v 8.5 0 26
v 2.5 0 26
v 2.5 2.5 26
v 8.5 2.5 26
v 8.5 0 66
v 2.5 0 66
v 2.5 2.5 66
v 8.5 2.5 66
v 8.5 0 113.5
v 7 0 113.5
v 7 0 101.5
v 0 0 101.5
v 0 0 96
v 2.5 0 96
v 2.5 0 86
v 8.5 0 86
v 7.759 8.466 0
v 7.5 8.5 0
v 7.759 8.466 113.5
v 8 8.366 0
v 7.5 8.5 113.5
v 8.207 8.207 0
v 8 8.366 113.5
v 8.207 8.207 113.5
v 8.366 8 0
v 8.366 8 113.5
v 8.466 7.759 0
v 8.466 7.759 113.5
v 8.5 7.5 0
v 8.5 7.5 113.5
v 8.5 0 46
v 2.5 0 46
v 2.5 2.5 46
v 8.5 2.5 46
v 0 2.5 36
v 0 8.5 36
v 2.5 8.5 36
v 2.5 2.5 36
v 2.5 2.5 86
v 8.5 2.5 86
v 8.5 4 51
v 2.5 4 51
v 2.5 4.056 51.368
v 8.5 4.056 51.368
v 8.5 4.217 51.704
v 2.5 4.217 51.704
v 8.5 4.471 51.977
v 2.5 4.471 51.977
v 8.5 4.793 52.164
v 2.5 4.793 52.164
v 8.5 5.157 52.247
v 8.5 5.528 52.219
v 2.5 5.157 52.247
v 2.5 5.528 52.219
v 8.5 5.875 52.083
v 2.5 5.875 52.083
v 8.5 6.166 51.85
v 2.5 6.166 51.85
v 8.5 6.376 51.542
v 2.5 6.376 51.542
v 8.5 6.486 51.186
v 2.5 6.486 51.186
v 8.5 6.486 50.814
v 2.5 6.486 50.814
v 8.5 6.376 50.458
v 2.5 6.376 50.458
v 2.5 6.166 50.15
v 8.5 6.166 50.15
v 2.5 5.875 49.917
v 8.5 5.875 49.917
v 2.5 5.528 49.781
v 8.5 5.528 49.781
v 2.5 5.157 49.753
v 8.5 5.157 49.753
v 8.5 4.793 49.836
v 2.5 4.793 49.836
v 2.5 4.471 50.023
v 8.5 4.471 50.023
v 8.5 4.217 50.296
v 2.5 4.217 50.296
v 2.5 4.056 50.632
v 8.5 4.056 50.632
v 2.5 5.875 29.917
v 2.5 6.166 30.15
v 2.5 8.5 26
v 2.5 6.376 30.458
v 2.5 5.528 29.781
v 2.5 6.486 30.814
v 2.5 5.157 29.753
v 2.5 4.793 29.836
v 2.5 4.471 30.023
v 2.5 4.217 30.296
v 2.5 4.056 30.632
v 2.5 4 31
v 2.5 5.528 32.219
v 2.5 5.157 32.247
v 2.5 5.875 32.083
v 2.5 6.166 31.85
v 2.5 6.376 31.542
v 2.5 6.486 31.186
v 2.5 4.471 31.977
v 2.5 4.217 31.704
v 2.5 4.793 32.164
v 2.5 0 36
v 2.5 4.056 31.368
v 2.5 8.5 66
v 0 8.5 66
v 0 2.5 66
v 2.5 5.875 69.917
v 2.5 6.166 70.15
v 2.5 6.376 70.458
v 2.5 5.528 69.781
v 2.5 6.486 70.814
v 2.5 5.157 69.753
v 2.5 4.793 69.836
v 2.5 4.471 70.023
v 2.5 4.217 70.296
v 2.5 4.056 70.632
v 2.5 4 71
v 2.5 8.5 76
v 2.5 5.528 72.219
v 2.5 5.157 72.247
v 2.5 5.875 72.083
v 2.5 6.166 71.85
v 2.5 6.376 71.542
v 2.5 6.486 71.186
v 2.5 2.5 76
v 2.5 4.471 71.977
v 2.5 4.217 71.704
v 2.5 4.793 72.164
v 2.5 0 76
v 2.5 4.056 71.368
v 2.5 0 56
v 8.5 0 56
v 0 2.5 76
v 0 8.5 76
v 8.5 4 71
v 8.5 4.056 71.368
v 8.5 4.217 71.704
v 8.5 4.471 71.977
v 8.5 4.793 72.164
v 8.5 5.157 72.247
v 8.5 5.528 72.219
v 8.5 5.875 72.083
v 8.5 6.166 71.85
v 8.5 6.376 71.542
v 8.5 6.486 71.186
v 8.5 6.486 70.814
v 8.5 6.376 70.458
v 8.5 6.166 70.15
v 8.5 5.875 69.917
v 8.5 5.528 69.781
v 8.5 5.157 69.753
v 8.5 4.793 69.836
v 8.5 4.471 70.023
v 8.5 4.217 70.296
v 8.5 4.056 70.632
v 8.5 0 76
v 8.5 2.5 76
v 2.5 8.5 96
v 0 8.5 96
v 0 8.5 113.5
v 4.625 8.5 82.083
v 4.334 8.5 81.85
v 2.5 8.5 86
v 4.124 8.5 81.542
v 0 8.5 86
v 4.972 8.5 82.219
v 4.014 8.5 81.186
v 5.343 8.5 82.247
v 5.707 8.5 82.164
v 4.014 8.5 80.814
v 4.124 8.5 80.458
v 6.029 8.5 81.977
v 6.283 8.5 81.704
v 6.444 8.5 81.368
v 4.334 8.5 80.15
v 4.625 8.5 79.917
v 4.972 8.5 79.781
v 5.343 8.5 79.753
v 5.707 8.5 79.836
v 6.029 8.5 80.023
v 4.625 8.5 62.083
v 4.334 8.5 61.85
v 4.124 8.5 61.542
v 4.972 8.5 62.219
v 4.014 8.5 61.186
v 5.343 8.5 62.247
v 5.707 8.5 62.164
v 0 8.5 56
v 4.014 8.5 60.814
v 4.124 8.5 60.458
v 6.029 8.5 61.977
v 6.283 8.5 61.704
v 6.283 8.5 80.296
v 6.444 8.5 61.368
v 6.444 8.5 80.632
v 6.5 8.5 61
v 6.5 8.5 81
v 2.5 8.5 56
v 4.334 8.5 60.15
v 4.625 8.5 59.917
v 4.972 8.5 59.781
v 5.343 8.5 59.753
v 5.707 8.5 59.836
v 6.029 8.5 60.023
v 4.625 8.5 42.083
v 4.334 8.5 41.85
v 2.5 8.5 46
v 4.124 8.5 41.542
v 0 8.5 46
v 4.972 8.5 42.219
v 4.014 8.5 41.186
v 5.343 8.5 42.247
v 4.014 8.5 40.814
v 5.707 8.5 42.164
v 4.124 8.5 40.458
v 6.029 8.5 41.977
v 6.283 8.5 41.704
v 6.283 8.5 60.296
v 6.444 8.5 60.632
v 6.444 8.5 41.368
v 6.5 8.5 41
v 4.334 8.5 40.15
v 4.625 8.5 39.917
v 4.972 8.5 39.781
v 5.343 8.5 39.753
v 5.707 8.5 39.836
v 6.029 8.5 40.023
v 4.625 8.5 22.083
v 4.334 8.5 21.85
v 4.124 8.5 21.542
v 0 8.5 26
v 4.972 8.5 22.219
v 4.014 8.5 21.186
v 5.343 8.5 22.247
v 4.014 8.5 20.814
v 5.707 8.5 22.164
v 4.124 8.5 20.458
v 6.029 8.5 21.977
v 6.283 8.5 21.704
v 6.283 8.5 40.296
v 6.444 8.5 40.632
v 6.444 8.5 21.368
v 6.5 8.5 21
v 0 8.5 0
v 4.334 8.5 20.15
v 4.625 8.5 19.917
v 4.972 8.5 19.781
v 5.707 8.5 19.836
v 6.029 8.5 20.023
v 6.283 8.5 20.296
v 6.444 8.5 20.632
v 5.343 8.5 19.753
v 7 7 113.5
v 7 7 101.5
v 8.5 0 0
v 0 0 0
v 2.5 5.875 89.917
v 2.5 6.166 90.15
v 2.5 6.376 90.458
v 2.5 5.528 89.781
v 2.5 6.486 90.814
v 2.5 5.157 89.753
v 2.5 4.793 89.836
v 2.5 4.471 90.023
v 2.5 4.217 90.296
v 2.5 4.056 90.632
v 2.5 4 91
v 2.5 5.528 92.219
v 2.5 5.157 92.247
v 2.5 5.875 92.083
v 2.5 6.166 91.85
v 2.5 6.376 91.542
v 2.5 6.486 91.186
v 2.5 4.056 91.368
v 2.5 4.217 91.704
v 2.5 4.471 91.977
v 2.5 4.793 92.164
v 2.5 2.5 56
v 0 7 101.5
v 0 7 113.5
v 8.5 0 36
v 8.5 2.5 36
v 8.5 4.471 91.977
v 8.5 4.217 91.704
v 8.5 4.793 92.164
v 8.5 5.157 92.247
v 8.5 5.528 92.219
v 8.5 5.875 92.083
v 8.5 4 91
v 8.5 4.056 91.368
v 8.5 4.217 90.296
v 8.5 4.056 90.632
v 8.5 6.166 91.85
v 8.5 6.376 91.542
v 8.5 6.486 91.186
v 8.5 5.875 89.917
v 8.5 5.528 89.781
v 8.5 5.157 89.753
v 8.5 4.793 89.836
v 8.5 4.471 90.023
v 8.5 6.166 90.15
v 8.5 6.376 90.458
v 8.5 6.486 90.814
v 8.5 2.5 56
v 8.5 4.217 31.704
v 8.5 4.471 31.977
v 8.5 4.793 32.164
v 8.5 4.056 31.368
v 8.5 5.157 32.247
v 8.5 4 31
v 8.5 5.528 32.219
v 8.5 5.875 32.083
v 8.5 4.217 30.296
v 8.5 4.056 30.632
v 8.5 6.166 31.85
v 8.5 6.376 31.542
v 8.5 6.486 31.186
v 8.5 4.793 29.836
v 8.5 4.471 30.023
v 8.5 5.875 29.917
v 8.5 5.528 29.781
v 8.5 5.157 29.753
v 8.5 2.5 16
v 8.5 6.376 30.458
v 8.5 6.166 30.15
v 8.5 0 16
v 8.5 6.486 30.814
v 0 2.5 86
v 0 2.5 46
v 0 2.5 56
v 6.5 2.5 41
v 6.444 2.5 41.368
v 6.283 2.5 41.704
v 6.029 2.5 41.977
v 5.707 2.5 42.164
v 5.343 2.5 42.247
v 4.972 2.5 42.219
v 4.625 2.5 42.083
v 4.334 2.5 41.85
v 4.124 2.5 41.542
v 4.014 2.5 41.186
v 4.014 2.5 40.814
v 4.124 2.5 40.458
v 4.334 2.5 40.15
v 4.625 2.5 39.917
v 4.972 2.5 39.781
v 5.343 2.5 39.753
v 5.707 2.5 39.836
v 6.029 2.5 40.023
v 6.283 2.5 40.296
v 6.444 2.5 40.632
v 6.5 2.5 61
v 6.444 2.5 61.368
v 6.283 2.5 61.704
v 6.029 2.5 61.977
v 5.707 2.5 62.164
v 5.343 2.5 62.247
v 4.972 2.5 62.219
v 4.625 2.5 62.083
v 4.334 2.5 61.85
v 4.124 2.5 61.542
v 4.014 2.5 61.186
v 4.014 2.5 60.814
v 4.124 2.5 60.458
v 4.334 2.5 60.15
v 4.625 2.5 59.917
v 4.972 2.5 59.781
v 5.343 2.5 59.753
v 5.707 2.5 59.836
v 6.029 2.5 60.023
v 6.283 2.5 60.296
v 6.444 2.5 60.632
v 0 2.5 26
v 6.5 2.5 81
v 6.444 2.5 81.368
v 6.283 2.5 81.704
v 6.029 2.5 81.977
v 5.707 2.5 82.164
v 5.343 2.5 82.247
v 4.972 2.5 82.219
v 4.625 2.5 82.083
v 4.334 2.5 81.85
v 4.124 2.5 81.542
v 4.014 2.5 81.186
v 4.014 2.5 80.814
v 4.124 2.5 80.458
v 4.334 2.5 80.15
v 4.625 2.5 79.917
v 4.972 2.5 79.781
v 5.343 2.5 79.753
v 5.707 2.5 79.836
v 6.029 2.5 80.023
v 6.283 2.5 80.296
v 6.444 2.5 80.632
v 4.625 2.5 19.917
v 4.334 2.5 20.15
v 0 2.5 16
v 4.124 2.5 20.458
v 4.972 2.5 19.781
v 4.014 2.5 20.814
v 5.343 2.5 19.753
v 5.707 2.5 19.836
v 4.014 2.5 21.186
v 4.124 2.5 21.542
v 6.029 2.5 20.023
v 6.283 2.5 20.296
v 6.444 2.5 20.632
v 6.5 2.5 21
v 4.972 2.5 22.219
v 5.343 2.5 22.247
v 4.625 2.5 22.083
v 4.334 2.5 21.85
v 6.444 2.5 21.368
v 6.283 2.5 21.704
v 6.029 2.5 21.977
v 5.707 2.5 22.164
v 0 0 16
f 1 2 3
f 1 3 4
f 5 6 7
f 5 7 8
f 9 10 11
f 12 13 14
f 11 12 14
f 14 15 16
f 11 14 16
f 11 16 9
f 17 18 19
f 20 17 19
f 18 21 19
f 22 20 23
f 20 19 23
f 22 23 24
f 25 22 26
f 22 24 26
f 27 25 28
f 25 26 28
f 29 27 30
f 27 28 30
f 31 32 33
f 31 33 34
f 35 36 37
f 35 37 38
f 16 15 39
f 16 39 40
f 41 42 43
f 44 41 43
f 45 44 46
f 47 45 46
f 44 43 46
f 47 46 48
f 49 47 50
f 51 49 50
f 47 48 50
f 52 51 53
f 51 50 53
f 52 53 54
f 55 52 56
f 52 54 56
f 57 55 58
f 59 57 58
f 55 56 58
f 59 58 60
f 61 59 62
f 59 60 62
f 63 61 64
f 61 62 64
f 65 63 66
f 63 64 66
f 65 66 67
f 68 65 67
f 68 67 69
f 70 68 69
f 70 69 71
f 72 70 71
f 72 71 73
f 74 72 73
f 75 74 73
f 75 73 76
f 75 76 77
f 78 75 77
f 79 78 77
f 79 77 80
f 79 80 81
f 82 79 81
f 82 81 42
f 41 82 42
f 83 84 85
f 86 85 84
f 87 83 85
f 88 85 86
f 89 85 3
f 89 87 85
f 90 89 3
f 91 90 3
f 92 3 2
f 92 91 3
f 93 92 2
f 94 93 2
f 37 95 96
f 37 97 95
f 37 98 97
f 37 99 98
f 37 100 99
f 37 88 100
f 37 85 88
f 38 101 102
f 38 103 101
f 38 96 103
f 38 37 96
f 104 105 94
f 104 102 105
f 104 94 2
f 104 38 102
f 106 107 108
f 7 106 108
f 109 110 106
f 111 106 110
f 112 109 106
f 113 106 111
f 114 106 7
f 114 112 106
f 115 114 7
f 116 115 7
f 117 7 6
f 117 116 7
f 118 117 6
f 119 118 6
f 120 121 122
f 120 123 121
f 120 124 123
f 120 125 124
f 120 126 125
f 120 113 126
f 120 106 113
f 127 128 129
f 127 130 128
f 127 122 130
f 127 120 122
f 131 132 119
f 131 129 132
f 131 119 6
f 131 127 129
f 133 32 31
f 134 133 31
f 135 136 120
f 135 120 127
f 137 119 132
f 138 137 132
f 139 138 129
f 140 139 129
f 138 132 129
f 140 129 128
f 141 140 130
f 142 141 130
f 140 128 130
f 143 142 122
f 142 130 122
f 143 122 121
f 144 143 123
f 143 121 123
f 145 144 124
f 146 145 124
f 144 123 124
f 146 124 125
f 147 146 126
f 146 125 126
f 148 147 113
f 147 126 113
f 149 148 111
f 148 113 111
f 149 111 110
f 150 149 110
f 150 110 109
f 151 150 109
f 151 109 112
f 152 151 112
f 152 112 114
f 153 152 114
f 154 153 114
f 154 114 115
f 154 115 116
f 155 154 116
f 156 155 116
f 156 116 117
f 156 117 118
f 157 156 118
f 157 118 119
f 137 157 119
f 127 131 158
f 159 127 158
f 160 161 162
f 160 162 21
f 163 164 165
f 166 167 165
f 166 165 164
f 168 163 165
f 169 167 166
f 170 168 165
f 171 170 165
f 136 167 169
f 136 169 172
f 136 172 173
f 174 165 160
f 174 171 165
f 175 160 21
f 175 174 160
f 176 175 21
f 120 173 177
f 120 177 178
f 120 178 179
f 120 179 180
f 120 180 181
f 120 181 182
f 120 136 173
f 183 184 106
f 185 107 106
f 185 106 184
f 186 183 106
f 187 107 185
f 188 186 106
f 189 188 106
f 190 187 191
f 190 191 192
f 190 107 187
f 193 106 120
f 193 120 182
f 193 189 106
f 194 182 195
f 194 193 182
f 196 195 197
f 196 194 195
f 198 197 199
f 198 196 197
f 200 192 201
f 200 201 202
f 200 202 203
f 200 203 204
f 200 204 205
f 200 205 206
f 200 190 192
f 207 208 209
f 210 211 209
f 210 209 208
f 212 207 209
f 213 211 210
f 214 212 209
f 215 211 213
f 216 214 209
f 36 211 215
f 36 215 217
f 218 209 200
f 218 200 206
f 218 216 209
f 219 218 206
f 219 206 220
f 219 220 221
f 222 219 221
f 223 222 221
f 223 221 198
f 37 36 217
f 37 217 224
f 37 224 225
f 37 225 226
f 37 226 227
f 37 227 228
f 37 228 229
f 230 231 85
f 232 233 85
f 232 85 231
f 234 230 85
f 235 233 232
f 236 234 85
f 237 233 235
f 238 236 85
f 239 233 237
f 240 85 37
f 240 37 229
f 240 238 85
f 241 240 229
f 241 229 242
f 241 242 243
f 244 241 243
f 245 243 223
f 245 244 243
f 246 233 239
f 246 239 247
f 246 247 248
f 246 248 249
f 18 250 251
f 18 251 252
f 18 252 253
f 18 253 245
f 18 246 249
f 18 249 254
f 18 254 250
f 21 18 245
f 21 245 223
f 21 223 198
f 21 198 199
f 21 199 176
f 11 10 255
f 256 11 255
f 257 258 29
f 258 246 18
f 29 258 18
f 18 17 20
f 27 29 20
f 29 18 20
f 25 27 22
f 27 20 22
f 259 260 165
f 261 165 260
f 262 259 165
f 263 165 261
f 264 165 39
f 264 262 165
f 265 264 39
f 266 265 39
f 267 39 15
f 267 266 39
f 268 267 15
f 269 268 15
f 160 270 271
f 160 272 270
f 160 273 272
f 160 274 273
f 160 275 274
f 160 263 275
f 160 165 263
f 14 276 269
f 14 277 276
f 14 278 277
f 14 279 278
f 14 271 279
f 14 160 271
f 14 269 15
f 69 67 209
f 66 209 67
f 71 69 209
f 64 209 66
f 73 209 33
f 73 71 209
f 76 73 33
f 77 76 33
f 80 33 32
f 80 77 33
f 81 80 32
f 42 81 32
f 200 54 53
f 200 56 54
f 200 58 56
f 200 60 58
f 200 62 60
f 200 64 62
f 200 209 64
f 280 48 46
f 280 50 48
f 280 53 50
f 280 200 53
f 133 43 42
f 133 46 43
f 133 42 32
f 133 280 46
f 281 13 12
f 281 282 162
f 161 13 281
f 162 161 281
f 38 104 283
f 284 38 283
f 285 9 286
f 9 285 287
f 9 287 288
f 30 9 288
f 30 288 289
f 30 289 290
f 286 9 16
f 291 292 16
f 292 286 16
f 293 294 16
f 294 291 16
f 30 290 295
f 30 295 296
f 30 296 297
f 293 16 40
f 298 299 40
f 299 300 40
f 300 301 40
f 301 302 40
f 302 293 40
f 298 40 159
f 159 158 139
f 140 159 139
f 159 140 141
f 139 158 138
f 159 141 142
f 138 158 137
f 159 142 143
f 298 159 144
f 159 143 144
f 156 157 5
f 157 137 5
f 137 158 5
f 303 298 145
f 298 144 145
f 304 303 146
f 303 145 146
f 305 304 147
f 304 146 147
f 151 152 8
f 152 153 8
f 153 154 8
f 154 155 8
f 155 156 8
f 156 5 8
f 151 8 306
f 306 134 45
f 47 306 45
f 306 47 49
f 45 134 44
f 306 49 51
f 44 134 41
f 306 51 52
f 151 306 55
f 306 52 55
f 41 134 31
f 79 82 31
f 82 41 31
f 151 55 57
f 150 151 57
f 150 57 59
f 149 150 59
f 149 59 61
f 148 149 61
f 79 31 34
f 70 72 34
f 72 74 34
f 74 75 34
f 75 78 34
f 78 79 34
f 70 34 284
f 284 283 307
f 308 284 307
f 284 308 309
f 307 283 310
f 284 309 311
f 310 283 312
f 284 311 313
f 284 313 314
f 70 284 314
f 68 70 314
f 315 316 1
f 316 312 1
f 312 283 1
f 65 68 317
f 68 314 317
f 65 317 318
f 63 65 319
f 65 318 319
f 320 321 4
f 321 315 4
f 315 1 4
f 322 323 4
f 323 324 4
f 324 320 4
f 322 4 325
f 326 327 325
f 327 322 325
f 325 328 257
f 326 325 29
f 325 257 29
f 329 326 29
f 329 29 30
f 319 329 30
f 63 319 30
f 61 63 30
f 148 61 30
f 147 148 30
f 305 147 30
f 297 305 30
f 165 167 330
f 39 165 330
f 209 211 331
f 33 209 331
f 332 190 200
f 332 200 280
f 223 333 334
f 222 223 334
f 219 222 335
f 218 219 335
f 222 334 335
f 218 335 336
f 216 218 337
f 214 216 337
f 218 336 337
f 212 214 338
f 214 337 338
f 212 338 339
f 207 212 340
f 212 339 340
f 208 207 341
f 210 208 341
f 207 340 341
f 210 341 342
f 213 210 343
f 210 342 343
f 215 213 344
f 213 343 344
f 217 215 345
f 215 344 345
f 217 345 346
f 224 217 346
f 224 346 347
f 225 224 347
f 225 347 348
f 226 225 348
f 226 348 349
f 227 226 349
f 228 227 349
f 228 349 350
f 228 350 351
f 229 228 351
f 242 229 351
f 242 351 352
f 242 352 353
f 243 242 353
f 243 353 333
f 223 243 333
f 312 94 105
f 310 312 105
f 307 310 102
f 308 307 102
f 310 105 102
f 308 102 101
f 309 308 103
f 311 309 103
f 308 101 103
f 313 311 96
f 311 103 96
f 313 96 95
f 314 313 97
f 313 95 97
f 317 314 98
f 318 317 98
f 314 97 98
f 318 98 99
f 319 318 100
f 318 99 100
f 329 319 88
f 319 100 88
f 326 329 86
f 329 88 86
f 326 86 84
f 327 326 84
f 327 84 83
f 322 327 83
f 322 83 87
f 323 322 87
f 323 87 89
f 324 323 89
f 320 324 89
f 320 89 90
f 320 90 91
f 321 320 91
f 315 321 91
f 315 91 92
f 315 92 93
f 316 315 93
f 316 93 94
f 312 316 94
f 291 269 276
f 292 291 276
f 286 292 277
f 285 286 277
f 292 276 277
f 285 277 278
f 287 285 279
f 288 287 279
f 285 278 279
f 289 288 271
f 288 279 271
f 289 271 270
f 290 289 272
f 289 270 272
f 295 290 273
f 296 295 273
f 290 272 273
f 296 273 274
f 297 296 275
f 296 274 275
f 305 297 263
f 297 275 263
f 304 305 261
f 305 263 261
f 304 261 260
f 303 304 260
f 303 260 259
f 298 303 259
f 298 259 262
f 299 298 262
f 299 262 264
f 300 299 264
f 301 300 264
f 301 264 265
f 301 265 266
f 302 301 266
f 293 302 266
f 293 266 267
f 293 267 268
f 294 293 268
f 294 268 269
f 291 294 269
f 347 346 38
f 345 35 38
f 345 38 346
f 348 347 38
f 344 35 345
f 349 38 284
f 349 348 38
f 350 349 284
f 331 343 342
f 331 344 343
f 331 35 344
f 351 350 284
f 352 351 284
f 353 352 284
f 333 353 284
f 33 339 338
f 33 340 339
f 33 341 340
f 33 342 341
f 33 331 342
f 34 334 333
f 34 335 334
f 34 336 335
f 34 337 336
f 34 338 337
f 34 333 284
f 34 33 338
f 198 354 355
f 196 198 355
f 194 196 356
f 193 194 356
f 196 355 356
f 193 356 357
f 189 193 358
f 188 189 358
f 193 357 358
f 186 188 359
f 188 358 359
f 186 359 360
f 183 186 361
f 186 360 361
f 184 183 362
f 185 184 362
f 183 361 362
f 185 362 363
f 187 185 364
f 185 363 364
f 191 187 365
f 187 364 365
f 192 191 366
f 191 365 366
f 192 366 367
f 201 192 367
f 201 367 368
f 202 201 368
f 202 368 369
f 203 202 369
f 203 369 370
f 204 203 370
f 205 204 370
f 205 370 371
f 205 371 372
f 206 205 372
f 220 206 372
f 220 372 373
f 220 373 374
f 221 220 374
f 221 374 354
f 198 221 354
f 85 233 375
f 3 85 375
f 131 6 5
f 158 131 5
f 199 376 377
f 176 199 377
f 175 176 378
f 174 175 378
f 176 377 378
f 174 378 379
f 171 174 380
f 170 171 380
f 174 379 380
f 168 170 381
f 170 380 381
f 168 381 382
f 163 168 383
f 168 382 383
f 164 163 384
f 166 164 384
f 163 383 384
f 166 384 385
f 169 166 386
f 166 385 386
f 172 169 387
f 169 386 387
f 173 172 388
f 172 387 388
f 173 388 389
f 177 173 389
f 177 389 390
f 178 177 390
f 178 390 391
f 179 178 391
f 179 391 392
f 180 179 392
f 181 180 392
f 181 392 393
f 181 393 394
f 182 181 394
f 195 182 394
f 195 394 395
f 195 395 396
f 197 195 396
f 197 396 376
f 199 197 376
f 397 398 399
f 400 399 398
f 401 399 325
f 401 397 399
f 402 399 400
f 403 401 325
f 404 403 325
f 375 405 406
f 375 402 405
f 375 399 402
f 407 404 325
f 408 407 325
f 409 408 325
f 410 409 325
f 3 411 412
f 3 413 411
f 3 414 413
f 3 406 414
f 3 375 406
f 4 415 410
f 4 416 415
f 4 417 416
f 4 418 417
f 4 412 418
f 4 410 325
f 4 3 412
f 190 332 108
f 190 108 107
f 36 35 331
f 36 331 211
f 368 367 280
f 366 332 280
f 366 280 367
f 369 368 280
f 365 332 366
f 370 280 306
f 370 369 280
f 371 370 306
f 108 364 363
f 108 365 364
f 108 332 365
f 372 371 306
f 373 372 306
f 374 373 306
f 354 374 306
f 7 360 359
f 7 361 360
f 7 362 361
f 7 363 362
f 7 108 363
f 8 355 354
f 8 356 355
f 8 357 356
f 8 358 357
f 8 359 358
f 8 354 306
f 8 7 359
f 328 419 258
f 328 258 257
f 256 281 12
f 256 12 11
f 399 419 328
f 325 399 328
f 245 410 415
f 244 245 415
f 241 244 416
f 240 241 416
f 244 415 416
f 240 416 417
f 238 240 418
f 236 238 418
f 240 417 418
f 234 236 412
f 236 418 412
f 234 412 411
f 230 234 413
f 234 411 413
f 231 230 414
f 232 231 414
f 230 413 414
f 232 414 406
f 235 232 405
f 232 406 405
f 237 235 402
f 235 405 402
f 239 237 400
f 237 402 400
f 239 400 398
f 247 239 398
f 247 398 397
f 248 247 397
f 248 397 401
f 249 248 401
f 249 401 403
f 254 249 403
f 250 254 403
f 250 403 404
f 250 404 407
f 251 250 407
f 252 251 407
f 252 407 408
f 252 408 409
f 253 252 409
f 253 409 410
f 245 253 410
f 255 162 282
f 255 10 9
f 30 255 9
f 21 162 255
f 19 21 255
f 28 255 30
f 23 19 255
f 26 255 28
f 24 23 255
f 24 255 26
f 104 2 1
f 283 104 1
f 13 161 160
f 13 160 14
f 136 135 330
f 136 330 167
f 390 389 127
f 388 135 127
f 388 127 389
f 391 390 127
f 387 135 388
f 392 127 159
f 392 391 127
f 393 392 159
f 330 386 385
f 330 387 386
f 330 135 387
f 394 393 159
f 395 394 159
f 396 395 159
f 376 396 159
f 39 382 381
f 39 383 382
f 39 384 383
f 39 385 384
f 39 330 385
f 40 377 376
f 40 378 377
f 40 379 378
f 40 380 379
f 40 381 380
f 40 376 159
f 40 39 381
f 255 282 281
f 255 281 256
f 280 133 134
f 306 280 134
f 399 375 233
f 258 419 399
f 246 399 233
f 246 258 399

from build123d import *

# Parameters (mm, degrees)
SKETCH_W               = 8.5
SKETCH_H               = 8.5
PAD_DEPTH              = 113.5
SKETCH001_W            = 10
SKETCH001_H            = 10
POCKET_DEPTH           = 2.5
LINEARPATTERN_COUNT    = 4
LINEARPATTERN_PITCH    = 20
SKETCH002_W            = 10
SKETCH002_H            = 10
POCKET001_DEPTH        = 2.5
LINEARPATTERN001_COUNT = 4
LINEARPATTERN001_PITCH = 20
FILLET_R               = 1
SKETCH003_R            = 1.25
POCKET002_DEPTH        = 6.001
LINEARPATTERN002_COUNT = 4
LINEARPATTERN002_PITCH = 20
SKETCH004_R            = 1.25
POCKET003_DEPTH        = 6.001
LINEARPATTERN003_COUNT = 4
LINEARPATTERN003_PITCH = 20
SKETCH005_W            = 8.5
SKETCH005_H            = 8.5
POCKET004_DEPTH        = 12


with BuildPart() as part:
    # Sketch → Pad (new body)
    with BuildSketch(Plane.XY):
        with Locations((4.25, 4.25)):
            Rectangle(SKETCH_W, SKETCH_H)
    extrude(amount=PAD_DEPTH)

    # Sketch001 → Pocket (cut)
    with BuildSketch(Plane.XZ):
        with Locations((4.410969, 21)):
            Rectangle(SKETCH001_W, SKETCH001_H)
    pocket = extrude(amount=-POCKET_DEPTH, mode=Mode.SUBTRACT)

    # LinearPattern: Pocket ×4
    with Locations(*[(0, 0, i * LINEARPATTERN_PITCH) for i in range(1, LINEARPATTERN_COUNT)]):
        add(pocket, mode=Mode.SUBTRACT)

    # Sketch002 → Pocket001 (cut)
    with BuildSketch(Plane(origin=(0, 0, 0), x_dir=(0, -1, 0), z_dir=(-1, 0, 0))):
        with Locations((-4.326825, 31)):
            Rectangle(SKETCH002_W, SKETCH002_H)
    pocket001 = extrude(amount=-POCKET001_DEPTH, mode=Mode.SUBTRACT)

    # LinearPattern001: Pocket001 ×4
    with Locations(*[(0, 0, i * LINEARPATTERN001_PITCH) for i in range(1, LINEARPATTERN001_COUNT)]):
        add(pocket001, mode=Mode.SUBTRACT)

    # Fillet
    fillet_edges = [part.edges().sort_by_distance(p)[0] for p in [
        (8.5, 8.5, 56.75),
    ]]
    fillet(fillet_edges, radius=FILLET_R)

    # Sketch003 → Pocket002 (cut, through all)
    with BuildSketch(Plane.XZ.offset(-2.5)):
        with Locations((5.25, 21)):
            Circle(SKETCH003_R)
    pocket002 = extrude(amount=-POCKET002_DEPTH, mode=Mode.SUBTRACT)

    # LinearPattern002: Pocket002 ×4
    with Locations(*[(0, 0, i * LINEARPATTERN002_PITCH) for i in range(1, LINEARPATTERN002_COUNT)]):
        add(pocket002, mode=Mode.SUBTRACT)

    # Sketch004 → Pocket003 (cut, through all)
    with BuildSketch(Plane(origin=(2.5, 0, 0), x_dir=(0, -1, 0), z_dir=(-1, 0, 0))):
        with Locations((-5.25, 31)):
            Circle(SKETCH004_R)
    pocket003 = extrude(amount=-POCKET003_DEPTH, mode=Mode.SUBTRACT)

    # LinearPattern003: Pocket003 ×4
    with Locations(*[(0, 0, i * LINEARPATTERN003_PITCH) for i in range(1, LINEARPATTERN003_COUNT)]):
        add(pocket003, mode=Mode.SUBTRACT)

    # Sketch005 → Pocket004 (cut)
    with BuildSketch(Plane.XY.offset(113.5)):
        with Locations((2.75, 2.75)):
            Rectangle(SKETCH005_W, SKETCH005_H)
    extrude(amount=-POCKET004_DEPTH, mode=Mode.SUBTRACT)


solid = part.part
